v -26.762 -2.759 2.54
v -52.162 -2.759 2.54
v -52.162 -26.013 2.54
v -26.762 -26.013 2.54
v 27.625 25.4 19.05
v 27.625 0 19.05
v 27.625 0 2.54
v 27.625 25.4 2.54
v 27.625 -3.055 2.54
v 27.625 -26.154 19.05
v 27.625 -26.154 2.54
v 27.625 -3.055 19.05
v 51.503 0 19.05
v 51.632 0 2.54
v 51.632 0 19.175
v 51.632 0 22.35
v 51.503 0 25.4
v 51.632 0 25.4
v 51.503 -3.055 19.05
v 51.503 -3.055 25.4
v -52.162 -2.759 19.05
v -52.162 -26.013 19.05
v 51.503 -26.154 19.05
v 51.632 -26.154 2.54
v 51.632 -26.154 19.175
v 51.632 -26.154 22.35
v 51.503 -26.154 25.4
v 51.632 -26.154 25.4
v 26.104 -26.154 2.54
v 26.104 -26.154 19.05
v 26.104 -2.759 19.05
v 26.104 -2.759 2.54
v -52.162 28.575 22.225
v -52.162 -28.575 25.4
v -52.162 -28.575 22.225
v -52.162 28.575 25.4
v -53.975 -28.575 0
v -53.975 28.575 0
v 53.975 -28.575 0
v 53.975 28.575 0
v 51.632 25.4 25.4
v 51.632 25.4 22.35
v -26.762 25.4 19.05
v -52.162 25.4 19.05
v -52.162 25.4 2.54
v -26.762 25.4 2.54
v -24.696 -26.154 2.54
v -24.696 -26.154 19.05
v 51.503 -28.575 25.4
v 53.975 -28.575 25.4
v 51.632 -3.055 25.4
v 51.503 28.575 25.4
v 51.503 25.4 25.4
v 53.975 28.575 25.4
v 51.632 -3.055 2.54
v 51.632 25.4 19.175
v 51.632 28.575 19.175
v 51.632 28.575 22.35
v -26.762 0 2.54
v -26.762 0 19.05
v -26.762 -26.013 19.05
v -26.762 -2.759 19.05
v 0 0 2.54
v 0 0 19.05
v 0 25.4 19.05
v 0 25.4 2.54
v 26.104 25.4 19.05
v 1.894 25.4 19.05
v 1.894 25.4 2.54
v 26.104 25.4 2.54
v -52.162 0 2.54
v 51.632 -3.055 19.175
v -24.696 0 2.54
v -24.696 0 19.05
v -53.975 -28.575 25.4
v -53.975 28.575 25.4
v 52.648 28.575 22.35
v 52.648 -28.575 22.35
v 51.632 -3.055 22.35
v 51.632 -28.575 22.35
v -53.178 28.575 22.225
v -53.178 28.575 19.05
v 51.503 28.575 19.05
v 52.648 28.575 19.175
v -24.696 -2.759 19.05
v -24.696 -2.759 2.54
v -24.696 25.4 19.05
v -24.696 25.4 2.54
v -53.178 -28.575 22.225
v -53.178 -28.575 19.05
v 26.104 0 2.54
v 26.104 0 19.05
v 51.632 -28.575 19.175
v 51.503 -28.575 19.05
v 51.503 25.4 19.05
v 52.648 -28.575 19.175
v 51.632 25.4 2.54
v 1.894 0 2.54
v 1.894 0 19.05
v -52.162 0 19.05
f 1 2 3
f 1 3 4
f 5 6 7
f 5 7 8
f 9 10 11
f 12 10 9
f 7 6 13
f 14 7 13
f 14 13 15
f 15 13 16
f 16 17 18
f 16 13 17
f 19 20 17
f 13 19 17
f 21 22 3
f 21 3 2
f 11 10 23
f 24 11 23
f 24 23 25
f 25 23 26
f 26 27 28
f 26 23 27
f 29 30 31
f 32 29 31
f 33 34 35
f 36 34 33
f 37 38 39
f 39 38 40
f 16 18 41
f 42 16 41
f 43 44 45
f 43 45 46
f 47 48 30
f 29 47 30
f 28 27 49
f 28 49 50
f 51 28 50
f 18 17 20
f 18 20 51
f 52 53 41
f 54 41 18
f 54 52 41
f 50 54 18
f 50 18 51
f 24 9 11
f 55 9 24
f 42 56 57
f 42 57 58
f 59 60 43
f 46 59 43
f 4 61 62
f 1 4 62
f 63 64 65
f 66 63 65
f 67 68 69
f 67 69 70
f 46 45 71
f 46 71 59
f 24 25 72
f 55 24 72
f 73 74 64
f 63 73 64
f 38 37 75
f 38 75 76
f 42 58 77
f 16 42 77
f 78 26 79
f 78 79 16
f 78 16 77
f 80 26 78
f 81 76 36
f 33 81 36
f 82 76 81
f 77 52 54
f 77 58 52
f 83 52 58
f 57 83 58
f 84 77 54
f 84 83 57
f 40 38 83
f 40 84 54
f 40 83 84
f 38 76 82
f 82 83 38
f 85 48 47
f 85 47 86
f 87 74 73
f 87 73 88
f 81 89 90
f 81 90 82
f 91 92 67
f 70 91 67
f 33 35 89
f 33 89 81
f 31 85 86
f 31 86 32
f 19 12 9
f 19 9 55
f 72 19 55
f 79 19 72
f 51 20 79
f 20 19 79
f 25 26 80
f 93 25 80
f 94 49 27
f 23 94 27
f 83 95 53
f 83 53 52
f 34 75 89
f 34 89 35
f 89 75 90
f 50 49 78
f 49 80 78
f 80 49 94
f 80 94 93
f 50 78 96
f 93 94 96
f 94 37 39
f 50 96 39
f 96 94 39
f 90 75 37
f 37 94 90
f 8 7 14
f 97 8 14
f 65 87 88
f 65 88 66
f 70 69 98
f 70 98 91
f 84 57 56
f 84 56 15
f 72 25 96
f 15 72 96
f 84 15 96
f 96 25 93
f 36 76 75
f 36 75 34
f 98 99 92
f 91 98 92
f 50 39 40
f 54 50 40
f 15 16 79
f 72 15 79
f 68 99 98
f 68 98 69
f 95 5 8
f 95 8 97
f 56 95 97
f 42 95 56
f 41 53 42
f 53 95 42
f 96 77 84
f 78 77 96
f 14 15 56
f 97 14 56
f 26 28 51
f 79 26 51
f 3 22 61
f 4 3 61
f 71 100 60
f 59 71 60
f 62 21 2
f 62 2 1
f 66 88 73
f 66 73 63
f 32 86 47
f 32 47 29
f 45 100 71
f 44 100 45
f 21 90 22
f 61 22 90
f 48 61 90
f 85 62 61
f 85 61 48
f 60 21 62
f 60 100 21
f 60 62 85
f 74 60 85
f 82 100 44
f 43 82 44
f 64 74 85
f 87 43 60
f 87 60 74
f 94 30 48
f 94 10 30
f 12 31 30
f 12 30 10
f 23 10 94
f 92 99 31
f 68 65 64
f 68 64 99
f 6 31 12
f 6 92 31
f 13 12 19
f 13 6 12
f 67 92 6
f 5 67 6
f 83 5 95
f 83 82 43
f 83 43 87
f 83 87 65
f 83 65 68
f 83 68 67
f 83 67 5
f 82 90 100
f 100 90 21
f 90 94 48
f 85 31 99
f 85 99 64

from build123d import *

# Parameters (mm, degrees)
F0_W      = 107.95
F0_H      = 57.15
F1_DEPTH  = 25.4
F2_W      = 25.4
F2_H      = 25.4
F2_H_2    = 23.2541756704
F2_W_2    = 24.6955640614
F2_W_3    = 50.8
F2_H_3    = 23.3953045681
F2_W_4    = 24.2106489923
F2_W_5    = 24.0074023604
F2_H_4    = 23.0993351433
F3_DEPTH  = 22.86
F4_W      = 103.6651358008
F4_H      = 57.15
F5_DEPTH  = 6.35
F6_W      = 57.15
F6_H      = 3.175
F7_DEPTH  = 1.016
F8_W      = 57.15
F8_H      = 3.175
F9_DEPTH  = 1.016
F10_DEPTH = 57.15


with BuildPart() as f1:
    # F0 (on Top) → F1 (new body)
    with BuildSketch(Plane.XY):
        Rectangle(F0_W, F0_H)
    extrude(amount=F1_DEPTH)

    # F2 (on face) → F3 (cut)
    with BuildSketch(Plane.XY.offset(25.4)):
        with Locations((-39.4618835628, 12.7)):
            Rectangle(F2_W, F2_H)
        with Locations((-39.4618835628, -14.386146795)):
            Rectangle(F2_W, F2_H_2)
        with Locations((-12.3477820307, 12.7)):
            Rectangle(F2_W_2, F2_H)
        with Locations((0.7044359386, -14.4567112438)):
            Rectangle(F2_W_3, F2_H_3)
        with Locations((13.9991114425, 12.7)):
            Rectangle(F2_W_4, F2_H)
        with Locations((39.6287105978, 12.7)):
            Rectangle(F2_W_5, F2_H)
        with Locations((39.6287105978, -14.6046959562)):
            Rectangle(F2_W_5, F2_H_4)
    extrude(amount=-F3_DEPTH, mode=Mode.SUBTRACT)

    # F4 (on face) → F5 (cut)
    with BuildSketch(Plane.XY.offset(25.4)):
        with Locations((-0.3293156624, 0)):
            Rectangle(F4_W, F4_H)
    extrude(amount=-F5_DEPTH, mode=Mode.SUBTRACT)

    # F6 (on face) → F7 (cut)
    with BuildSketch(Plane.YZ.offset(-52.1618835628)):
        with Locations((0, 20.6375)):
            Rectangle(F6_W, F6_H)
    extrude(amount=-F7_DEPTH, mode=Mode.SUBTRACT)

    # F8 (on face) → F9 (cut)
    with BuildSketch(Plane(origin=(51.632411778, 0, 0), x_dir=(0, -1, 0), z_dir=(-1, 0, 0))):
        with Locations((0.0344297111, 20.7629382104)):
            Rectangle(F8_W, F8_H)
    extrude(amount=-F9_DEPTH, mode=Mode.SUBTRACT)

    # F10 (cut): a face of the model
    f10_faces = [f1.faces().sort_by_distance(p)[0] for p in [
        (52.140411778, 28.5405702889, 20.7629382104),
    ]]
    extrude(f10_faces, amount=-F10_DEPTH, mode=Mode.SUBTRACT)


solid = f1.part
